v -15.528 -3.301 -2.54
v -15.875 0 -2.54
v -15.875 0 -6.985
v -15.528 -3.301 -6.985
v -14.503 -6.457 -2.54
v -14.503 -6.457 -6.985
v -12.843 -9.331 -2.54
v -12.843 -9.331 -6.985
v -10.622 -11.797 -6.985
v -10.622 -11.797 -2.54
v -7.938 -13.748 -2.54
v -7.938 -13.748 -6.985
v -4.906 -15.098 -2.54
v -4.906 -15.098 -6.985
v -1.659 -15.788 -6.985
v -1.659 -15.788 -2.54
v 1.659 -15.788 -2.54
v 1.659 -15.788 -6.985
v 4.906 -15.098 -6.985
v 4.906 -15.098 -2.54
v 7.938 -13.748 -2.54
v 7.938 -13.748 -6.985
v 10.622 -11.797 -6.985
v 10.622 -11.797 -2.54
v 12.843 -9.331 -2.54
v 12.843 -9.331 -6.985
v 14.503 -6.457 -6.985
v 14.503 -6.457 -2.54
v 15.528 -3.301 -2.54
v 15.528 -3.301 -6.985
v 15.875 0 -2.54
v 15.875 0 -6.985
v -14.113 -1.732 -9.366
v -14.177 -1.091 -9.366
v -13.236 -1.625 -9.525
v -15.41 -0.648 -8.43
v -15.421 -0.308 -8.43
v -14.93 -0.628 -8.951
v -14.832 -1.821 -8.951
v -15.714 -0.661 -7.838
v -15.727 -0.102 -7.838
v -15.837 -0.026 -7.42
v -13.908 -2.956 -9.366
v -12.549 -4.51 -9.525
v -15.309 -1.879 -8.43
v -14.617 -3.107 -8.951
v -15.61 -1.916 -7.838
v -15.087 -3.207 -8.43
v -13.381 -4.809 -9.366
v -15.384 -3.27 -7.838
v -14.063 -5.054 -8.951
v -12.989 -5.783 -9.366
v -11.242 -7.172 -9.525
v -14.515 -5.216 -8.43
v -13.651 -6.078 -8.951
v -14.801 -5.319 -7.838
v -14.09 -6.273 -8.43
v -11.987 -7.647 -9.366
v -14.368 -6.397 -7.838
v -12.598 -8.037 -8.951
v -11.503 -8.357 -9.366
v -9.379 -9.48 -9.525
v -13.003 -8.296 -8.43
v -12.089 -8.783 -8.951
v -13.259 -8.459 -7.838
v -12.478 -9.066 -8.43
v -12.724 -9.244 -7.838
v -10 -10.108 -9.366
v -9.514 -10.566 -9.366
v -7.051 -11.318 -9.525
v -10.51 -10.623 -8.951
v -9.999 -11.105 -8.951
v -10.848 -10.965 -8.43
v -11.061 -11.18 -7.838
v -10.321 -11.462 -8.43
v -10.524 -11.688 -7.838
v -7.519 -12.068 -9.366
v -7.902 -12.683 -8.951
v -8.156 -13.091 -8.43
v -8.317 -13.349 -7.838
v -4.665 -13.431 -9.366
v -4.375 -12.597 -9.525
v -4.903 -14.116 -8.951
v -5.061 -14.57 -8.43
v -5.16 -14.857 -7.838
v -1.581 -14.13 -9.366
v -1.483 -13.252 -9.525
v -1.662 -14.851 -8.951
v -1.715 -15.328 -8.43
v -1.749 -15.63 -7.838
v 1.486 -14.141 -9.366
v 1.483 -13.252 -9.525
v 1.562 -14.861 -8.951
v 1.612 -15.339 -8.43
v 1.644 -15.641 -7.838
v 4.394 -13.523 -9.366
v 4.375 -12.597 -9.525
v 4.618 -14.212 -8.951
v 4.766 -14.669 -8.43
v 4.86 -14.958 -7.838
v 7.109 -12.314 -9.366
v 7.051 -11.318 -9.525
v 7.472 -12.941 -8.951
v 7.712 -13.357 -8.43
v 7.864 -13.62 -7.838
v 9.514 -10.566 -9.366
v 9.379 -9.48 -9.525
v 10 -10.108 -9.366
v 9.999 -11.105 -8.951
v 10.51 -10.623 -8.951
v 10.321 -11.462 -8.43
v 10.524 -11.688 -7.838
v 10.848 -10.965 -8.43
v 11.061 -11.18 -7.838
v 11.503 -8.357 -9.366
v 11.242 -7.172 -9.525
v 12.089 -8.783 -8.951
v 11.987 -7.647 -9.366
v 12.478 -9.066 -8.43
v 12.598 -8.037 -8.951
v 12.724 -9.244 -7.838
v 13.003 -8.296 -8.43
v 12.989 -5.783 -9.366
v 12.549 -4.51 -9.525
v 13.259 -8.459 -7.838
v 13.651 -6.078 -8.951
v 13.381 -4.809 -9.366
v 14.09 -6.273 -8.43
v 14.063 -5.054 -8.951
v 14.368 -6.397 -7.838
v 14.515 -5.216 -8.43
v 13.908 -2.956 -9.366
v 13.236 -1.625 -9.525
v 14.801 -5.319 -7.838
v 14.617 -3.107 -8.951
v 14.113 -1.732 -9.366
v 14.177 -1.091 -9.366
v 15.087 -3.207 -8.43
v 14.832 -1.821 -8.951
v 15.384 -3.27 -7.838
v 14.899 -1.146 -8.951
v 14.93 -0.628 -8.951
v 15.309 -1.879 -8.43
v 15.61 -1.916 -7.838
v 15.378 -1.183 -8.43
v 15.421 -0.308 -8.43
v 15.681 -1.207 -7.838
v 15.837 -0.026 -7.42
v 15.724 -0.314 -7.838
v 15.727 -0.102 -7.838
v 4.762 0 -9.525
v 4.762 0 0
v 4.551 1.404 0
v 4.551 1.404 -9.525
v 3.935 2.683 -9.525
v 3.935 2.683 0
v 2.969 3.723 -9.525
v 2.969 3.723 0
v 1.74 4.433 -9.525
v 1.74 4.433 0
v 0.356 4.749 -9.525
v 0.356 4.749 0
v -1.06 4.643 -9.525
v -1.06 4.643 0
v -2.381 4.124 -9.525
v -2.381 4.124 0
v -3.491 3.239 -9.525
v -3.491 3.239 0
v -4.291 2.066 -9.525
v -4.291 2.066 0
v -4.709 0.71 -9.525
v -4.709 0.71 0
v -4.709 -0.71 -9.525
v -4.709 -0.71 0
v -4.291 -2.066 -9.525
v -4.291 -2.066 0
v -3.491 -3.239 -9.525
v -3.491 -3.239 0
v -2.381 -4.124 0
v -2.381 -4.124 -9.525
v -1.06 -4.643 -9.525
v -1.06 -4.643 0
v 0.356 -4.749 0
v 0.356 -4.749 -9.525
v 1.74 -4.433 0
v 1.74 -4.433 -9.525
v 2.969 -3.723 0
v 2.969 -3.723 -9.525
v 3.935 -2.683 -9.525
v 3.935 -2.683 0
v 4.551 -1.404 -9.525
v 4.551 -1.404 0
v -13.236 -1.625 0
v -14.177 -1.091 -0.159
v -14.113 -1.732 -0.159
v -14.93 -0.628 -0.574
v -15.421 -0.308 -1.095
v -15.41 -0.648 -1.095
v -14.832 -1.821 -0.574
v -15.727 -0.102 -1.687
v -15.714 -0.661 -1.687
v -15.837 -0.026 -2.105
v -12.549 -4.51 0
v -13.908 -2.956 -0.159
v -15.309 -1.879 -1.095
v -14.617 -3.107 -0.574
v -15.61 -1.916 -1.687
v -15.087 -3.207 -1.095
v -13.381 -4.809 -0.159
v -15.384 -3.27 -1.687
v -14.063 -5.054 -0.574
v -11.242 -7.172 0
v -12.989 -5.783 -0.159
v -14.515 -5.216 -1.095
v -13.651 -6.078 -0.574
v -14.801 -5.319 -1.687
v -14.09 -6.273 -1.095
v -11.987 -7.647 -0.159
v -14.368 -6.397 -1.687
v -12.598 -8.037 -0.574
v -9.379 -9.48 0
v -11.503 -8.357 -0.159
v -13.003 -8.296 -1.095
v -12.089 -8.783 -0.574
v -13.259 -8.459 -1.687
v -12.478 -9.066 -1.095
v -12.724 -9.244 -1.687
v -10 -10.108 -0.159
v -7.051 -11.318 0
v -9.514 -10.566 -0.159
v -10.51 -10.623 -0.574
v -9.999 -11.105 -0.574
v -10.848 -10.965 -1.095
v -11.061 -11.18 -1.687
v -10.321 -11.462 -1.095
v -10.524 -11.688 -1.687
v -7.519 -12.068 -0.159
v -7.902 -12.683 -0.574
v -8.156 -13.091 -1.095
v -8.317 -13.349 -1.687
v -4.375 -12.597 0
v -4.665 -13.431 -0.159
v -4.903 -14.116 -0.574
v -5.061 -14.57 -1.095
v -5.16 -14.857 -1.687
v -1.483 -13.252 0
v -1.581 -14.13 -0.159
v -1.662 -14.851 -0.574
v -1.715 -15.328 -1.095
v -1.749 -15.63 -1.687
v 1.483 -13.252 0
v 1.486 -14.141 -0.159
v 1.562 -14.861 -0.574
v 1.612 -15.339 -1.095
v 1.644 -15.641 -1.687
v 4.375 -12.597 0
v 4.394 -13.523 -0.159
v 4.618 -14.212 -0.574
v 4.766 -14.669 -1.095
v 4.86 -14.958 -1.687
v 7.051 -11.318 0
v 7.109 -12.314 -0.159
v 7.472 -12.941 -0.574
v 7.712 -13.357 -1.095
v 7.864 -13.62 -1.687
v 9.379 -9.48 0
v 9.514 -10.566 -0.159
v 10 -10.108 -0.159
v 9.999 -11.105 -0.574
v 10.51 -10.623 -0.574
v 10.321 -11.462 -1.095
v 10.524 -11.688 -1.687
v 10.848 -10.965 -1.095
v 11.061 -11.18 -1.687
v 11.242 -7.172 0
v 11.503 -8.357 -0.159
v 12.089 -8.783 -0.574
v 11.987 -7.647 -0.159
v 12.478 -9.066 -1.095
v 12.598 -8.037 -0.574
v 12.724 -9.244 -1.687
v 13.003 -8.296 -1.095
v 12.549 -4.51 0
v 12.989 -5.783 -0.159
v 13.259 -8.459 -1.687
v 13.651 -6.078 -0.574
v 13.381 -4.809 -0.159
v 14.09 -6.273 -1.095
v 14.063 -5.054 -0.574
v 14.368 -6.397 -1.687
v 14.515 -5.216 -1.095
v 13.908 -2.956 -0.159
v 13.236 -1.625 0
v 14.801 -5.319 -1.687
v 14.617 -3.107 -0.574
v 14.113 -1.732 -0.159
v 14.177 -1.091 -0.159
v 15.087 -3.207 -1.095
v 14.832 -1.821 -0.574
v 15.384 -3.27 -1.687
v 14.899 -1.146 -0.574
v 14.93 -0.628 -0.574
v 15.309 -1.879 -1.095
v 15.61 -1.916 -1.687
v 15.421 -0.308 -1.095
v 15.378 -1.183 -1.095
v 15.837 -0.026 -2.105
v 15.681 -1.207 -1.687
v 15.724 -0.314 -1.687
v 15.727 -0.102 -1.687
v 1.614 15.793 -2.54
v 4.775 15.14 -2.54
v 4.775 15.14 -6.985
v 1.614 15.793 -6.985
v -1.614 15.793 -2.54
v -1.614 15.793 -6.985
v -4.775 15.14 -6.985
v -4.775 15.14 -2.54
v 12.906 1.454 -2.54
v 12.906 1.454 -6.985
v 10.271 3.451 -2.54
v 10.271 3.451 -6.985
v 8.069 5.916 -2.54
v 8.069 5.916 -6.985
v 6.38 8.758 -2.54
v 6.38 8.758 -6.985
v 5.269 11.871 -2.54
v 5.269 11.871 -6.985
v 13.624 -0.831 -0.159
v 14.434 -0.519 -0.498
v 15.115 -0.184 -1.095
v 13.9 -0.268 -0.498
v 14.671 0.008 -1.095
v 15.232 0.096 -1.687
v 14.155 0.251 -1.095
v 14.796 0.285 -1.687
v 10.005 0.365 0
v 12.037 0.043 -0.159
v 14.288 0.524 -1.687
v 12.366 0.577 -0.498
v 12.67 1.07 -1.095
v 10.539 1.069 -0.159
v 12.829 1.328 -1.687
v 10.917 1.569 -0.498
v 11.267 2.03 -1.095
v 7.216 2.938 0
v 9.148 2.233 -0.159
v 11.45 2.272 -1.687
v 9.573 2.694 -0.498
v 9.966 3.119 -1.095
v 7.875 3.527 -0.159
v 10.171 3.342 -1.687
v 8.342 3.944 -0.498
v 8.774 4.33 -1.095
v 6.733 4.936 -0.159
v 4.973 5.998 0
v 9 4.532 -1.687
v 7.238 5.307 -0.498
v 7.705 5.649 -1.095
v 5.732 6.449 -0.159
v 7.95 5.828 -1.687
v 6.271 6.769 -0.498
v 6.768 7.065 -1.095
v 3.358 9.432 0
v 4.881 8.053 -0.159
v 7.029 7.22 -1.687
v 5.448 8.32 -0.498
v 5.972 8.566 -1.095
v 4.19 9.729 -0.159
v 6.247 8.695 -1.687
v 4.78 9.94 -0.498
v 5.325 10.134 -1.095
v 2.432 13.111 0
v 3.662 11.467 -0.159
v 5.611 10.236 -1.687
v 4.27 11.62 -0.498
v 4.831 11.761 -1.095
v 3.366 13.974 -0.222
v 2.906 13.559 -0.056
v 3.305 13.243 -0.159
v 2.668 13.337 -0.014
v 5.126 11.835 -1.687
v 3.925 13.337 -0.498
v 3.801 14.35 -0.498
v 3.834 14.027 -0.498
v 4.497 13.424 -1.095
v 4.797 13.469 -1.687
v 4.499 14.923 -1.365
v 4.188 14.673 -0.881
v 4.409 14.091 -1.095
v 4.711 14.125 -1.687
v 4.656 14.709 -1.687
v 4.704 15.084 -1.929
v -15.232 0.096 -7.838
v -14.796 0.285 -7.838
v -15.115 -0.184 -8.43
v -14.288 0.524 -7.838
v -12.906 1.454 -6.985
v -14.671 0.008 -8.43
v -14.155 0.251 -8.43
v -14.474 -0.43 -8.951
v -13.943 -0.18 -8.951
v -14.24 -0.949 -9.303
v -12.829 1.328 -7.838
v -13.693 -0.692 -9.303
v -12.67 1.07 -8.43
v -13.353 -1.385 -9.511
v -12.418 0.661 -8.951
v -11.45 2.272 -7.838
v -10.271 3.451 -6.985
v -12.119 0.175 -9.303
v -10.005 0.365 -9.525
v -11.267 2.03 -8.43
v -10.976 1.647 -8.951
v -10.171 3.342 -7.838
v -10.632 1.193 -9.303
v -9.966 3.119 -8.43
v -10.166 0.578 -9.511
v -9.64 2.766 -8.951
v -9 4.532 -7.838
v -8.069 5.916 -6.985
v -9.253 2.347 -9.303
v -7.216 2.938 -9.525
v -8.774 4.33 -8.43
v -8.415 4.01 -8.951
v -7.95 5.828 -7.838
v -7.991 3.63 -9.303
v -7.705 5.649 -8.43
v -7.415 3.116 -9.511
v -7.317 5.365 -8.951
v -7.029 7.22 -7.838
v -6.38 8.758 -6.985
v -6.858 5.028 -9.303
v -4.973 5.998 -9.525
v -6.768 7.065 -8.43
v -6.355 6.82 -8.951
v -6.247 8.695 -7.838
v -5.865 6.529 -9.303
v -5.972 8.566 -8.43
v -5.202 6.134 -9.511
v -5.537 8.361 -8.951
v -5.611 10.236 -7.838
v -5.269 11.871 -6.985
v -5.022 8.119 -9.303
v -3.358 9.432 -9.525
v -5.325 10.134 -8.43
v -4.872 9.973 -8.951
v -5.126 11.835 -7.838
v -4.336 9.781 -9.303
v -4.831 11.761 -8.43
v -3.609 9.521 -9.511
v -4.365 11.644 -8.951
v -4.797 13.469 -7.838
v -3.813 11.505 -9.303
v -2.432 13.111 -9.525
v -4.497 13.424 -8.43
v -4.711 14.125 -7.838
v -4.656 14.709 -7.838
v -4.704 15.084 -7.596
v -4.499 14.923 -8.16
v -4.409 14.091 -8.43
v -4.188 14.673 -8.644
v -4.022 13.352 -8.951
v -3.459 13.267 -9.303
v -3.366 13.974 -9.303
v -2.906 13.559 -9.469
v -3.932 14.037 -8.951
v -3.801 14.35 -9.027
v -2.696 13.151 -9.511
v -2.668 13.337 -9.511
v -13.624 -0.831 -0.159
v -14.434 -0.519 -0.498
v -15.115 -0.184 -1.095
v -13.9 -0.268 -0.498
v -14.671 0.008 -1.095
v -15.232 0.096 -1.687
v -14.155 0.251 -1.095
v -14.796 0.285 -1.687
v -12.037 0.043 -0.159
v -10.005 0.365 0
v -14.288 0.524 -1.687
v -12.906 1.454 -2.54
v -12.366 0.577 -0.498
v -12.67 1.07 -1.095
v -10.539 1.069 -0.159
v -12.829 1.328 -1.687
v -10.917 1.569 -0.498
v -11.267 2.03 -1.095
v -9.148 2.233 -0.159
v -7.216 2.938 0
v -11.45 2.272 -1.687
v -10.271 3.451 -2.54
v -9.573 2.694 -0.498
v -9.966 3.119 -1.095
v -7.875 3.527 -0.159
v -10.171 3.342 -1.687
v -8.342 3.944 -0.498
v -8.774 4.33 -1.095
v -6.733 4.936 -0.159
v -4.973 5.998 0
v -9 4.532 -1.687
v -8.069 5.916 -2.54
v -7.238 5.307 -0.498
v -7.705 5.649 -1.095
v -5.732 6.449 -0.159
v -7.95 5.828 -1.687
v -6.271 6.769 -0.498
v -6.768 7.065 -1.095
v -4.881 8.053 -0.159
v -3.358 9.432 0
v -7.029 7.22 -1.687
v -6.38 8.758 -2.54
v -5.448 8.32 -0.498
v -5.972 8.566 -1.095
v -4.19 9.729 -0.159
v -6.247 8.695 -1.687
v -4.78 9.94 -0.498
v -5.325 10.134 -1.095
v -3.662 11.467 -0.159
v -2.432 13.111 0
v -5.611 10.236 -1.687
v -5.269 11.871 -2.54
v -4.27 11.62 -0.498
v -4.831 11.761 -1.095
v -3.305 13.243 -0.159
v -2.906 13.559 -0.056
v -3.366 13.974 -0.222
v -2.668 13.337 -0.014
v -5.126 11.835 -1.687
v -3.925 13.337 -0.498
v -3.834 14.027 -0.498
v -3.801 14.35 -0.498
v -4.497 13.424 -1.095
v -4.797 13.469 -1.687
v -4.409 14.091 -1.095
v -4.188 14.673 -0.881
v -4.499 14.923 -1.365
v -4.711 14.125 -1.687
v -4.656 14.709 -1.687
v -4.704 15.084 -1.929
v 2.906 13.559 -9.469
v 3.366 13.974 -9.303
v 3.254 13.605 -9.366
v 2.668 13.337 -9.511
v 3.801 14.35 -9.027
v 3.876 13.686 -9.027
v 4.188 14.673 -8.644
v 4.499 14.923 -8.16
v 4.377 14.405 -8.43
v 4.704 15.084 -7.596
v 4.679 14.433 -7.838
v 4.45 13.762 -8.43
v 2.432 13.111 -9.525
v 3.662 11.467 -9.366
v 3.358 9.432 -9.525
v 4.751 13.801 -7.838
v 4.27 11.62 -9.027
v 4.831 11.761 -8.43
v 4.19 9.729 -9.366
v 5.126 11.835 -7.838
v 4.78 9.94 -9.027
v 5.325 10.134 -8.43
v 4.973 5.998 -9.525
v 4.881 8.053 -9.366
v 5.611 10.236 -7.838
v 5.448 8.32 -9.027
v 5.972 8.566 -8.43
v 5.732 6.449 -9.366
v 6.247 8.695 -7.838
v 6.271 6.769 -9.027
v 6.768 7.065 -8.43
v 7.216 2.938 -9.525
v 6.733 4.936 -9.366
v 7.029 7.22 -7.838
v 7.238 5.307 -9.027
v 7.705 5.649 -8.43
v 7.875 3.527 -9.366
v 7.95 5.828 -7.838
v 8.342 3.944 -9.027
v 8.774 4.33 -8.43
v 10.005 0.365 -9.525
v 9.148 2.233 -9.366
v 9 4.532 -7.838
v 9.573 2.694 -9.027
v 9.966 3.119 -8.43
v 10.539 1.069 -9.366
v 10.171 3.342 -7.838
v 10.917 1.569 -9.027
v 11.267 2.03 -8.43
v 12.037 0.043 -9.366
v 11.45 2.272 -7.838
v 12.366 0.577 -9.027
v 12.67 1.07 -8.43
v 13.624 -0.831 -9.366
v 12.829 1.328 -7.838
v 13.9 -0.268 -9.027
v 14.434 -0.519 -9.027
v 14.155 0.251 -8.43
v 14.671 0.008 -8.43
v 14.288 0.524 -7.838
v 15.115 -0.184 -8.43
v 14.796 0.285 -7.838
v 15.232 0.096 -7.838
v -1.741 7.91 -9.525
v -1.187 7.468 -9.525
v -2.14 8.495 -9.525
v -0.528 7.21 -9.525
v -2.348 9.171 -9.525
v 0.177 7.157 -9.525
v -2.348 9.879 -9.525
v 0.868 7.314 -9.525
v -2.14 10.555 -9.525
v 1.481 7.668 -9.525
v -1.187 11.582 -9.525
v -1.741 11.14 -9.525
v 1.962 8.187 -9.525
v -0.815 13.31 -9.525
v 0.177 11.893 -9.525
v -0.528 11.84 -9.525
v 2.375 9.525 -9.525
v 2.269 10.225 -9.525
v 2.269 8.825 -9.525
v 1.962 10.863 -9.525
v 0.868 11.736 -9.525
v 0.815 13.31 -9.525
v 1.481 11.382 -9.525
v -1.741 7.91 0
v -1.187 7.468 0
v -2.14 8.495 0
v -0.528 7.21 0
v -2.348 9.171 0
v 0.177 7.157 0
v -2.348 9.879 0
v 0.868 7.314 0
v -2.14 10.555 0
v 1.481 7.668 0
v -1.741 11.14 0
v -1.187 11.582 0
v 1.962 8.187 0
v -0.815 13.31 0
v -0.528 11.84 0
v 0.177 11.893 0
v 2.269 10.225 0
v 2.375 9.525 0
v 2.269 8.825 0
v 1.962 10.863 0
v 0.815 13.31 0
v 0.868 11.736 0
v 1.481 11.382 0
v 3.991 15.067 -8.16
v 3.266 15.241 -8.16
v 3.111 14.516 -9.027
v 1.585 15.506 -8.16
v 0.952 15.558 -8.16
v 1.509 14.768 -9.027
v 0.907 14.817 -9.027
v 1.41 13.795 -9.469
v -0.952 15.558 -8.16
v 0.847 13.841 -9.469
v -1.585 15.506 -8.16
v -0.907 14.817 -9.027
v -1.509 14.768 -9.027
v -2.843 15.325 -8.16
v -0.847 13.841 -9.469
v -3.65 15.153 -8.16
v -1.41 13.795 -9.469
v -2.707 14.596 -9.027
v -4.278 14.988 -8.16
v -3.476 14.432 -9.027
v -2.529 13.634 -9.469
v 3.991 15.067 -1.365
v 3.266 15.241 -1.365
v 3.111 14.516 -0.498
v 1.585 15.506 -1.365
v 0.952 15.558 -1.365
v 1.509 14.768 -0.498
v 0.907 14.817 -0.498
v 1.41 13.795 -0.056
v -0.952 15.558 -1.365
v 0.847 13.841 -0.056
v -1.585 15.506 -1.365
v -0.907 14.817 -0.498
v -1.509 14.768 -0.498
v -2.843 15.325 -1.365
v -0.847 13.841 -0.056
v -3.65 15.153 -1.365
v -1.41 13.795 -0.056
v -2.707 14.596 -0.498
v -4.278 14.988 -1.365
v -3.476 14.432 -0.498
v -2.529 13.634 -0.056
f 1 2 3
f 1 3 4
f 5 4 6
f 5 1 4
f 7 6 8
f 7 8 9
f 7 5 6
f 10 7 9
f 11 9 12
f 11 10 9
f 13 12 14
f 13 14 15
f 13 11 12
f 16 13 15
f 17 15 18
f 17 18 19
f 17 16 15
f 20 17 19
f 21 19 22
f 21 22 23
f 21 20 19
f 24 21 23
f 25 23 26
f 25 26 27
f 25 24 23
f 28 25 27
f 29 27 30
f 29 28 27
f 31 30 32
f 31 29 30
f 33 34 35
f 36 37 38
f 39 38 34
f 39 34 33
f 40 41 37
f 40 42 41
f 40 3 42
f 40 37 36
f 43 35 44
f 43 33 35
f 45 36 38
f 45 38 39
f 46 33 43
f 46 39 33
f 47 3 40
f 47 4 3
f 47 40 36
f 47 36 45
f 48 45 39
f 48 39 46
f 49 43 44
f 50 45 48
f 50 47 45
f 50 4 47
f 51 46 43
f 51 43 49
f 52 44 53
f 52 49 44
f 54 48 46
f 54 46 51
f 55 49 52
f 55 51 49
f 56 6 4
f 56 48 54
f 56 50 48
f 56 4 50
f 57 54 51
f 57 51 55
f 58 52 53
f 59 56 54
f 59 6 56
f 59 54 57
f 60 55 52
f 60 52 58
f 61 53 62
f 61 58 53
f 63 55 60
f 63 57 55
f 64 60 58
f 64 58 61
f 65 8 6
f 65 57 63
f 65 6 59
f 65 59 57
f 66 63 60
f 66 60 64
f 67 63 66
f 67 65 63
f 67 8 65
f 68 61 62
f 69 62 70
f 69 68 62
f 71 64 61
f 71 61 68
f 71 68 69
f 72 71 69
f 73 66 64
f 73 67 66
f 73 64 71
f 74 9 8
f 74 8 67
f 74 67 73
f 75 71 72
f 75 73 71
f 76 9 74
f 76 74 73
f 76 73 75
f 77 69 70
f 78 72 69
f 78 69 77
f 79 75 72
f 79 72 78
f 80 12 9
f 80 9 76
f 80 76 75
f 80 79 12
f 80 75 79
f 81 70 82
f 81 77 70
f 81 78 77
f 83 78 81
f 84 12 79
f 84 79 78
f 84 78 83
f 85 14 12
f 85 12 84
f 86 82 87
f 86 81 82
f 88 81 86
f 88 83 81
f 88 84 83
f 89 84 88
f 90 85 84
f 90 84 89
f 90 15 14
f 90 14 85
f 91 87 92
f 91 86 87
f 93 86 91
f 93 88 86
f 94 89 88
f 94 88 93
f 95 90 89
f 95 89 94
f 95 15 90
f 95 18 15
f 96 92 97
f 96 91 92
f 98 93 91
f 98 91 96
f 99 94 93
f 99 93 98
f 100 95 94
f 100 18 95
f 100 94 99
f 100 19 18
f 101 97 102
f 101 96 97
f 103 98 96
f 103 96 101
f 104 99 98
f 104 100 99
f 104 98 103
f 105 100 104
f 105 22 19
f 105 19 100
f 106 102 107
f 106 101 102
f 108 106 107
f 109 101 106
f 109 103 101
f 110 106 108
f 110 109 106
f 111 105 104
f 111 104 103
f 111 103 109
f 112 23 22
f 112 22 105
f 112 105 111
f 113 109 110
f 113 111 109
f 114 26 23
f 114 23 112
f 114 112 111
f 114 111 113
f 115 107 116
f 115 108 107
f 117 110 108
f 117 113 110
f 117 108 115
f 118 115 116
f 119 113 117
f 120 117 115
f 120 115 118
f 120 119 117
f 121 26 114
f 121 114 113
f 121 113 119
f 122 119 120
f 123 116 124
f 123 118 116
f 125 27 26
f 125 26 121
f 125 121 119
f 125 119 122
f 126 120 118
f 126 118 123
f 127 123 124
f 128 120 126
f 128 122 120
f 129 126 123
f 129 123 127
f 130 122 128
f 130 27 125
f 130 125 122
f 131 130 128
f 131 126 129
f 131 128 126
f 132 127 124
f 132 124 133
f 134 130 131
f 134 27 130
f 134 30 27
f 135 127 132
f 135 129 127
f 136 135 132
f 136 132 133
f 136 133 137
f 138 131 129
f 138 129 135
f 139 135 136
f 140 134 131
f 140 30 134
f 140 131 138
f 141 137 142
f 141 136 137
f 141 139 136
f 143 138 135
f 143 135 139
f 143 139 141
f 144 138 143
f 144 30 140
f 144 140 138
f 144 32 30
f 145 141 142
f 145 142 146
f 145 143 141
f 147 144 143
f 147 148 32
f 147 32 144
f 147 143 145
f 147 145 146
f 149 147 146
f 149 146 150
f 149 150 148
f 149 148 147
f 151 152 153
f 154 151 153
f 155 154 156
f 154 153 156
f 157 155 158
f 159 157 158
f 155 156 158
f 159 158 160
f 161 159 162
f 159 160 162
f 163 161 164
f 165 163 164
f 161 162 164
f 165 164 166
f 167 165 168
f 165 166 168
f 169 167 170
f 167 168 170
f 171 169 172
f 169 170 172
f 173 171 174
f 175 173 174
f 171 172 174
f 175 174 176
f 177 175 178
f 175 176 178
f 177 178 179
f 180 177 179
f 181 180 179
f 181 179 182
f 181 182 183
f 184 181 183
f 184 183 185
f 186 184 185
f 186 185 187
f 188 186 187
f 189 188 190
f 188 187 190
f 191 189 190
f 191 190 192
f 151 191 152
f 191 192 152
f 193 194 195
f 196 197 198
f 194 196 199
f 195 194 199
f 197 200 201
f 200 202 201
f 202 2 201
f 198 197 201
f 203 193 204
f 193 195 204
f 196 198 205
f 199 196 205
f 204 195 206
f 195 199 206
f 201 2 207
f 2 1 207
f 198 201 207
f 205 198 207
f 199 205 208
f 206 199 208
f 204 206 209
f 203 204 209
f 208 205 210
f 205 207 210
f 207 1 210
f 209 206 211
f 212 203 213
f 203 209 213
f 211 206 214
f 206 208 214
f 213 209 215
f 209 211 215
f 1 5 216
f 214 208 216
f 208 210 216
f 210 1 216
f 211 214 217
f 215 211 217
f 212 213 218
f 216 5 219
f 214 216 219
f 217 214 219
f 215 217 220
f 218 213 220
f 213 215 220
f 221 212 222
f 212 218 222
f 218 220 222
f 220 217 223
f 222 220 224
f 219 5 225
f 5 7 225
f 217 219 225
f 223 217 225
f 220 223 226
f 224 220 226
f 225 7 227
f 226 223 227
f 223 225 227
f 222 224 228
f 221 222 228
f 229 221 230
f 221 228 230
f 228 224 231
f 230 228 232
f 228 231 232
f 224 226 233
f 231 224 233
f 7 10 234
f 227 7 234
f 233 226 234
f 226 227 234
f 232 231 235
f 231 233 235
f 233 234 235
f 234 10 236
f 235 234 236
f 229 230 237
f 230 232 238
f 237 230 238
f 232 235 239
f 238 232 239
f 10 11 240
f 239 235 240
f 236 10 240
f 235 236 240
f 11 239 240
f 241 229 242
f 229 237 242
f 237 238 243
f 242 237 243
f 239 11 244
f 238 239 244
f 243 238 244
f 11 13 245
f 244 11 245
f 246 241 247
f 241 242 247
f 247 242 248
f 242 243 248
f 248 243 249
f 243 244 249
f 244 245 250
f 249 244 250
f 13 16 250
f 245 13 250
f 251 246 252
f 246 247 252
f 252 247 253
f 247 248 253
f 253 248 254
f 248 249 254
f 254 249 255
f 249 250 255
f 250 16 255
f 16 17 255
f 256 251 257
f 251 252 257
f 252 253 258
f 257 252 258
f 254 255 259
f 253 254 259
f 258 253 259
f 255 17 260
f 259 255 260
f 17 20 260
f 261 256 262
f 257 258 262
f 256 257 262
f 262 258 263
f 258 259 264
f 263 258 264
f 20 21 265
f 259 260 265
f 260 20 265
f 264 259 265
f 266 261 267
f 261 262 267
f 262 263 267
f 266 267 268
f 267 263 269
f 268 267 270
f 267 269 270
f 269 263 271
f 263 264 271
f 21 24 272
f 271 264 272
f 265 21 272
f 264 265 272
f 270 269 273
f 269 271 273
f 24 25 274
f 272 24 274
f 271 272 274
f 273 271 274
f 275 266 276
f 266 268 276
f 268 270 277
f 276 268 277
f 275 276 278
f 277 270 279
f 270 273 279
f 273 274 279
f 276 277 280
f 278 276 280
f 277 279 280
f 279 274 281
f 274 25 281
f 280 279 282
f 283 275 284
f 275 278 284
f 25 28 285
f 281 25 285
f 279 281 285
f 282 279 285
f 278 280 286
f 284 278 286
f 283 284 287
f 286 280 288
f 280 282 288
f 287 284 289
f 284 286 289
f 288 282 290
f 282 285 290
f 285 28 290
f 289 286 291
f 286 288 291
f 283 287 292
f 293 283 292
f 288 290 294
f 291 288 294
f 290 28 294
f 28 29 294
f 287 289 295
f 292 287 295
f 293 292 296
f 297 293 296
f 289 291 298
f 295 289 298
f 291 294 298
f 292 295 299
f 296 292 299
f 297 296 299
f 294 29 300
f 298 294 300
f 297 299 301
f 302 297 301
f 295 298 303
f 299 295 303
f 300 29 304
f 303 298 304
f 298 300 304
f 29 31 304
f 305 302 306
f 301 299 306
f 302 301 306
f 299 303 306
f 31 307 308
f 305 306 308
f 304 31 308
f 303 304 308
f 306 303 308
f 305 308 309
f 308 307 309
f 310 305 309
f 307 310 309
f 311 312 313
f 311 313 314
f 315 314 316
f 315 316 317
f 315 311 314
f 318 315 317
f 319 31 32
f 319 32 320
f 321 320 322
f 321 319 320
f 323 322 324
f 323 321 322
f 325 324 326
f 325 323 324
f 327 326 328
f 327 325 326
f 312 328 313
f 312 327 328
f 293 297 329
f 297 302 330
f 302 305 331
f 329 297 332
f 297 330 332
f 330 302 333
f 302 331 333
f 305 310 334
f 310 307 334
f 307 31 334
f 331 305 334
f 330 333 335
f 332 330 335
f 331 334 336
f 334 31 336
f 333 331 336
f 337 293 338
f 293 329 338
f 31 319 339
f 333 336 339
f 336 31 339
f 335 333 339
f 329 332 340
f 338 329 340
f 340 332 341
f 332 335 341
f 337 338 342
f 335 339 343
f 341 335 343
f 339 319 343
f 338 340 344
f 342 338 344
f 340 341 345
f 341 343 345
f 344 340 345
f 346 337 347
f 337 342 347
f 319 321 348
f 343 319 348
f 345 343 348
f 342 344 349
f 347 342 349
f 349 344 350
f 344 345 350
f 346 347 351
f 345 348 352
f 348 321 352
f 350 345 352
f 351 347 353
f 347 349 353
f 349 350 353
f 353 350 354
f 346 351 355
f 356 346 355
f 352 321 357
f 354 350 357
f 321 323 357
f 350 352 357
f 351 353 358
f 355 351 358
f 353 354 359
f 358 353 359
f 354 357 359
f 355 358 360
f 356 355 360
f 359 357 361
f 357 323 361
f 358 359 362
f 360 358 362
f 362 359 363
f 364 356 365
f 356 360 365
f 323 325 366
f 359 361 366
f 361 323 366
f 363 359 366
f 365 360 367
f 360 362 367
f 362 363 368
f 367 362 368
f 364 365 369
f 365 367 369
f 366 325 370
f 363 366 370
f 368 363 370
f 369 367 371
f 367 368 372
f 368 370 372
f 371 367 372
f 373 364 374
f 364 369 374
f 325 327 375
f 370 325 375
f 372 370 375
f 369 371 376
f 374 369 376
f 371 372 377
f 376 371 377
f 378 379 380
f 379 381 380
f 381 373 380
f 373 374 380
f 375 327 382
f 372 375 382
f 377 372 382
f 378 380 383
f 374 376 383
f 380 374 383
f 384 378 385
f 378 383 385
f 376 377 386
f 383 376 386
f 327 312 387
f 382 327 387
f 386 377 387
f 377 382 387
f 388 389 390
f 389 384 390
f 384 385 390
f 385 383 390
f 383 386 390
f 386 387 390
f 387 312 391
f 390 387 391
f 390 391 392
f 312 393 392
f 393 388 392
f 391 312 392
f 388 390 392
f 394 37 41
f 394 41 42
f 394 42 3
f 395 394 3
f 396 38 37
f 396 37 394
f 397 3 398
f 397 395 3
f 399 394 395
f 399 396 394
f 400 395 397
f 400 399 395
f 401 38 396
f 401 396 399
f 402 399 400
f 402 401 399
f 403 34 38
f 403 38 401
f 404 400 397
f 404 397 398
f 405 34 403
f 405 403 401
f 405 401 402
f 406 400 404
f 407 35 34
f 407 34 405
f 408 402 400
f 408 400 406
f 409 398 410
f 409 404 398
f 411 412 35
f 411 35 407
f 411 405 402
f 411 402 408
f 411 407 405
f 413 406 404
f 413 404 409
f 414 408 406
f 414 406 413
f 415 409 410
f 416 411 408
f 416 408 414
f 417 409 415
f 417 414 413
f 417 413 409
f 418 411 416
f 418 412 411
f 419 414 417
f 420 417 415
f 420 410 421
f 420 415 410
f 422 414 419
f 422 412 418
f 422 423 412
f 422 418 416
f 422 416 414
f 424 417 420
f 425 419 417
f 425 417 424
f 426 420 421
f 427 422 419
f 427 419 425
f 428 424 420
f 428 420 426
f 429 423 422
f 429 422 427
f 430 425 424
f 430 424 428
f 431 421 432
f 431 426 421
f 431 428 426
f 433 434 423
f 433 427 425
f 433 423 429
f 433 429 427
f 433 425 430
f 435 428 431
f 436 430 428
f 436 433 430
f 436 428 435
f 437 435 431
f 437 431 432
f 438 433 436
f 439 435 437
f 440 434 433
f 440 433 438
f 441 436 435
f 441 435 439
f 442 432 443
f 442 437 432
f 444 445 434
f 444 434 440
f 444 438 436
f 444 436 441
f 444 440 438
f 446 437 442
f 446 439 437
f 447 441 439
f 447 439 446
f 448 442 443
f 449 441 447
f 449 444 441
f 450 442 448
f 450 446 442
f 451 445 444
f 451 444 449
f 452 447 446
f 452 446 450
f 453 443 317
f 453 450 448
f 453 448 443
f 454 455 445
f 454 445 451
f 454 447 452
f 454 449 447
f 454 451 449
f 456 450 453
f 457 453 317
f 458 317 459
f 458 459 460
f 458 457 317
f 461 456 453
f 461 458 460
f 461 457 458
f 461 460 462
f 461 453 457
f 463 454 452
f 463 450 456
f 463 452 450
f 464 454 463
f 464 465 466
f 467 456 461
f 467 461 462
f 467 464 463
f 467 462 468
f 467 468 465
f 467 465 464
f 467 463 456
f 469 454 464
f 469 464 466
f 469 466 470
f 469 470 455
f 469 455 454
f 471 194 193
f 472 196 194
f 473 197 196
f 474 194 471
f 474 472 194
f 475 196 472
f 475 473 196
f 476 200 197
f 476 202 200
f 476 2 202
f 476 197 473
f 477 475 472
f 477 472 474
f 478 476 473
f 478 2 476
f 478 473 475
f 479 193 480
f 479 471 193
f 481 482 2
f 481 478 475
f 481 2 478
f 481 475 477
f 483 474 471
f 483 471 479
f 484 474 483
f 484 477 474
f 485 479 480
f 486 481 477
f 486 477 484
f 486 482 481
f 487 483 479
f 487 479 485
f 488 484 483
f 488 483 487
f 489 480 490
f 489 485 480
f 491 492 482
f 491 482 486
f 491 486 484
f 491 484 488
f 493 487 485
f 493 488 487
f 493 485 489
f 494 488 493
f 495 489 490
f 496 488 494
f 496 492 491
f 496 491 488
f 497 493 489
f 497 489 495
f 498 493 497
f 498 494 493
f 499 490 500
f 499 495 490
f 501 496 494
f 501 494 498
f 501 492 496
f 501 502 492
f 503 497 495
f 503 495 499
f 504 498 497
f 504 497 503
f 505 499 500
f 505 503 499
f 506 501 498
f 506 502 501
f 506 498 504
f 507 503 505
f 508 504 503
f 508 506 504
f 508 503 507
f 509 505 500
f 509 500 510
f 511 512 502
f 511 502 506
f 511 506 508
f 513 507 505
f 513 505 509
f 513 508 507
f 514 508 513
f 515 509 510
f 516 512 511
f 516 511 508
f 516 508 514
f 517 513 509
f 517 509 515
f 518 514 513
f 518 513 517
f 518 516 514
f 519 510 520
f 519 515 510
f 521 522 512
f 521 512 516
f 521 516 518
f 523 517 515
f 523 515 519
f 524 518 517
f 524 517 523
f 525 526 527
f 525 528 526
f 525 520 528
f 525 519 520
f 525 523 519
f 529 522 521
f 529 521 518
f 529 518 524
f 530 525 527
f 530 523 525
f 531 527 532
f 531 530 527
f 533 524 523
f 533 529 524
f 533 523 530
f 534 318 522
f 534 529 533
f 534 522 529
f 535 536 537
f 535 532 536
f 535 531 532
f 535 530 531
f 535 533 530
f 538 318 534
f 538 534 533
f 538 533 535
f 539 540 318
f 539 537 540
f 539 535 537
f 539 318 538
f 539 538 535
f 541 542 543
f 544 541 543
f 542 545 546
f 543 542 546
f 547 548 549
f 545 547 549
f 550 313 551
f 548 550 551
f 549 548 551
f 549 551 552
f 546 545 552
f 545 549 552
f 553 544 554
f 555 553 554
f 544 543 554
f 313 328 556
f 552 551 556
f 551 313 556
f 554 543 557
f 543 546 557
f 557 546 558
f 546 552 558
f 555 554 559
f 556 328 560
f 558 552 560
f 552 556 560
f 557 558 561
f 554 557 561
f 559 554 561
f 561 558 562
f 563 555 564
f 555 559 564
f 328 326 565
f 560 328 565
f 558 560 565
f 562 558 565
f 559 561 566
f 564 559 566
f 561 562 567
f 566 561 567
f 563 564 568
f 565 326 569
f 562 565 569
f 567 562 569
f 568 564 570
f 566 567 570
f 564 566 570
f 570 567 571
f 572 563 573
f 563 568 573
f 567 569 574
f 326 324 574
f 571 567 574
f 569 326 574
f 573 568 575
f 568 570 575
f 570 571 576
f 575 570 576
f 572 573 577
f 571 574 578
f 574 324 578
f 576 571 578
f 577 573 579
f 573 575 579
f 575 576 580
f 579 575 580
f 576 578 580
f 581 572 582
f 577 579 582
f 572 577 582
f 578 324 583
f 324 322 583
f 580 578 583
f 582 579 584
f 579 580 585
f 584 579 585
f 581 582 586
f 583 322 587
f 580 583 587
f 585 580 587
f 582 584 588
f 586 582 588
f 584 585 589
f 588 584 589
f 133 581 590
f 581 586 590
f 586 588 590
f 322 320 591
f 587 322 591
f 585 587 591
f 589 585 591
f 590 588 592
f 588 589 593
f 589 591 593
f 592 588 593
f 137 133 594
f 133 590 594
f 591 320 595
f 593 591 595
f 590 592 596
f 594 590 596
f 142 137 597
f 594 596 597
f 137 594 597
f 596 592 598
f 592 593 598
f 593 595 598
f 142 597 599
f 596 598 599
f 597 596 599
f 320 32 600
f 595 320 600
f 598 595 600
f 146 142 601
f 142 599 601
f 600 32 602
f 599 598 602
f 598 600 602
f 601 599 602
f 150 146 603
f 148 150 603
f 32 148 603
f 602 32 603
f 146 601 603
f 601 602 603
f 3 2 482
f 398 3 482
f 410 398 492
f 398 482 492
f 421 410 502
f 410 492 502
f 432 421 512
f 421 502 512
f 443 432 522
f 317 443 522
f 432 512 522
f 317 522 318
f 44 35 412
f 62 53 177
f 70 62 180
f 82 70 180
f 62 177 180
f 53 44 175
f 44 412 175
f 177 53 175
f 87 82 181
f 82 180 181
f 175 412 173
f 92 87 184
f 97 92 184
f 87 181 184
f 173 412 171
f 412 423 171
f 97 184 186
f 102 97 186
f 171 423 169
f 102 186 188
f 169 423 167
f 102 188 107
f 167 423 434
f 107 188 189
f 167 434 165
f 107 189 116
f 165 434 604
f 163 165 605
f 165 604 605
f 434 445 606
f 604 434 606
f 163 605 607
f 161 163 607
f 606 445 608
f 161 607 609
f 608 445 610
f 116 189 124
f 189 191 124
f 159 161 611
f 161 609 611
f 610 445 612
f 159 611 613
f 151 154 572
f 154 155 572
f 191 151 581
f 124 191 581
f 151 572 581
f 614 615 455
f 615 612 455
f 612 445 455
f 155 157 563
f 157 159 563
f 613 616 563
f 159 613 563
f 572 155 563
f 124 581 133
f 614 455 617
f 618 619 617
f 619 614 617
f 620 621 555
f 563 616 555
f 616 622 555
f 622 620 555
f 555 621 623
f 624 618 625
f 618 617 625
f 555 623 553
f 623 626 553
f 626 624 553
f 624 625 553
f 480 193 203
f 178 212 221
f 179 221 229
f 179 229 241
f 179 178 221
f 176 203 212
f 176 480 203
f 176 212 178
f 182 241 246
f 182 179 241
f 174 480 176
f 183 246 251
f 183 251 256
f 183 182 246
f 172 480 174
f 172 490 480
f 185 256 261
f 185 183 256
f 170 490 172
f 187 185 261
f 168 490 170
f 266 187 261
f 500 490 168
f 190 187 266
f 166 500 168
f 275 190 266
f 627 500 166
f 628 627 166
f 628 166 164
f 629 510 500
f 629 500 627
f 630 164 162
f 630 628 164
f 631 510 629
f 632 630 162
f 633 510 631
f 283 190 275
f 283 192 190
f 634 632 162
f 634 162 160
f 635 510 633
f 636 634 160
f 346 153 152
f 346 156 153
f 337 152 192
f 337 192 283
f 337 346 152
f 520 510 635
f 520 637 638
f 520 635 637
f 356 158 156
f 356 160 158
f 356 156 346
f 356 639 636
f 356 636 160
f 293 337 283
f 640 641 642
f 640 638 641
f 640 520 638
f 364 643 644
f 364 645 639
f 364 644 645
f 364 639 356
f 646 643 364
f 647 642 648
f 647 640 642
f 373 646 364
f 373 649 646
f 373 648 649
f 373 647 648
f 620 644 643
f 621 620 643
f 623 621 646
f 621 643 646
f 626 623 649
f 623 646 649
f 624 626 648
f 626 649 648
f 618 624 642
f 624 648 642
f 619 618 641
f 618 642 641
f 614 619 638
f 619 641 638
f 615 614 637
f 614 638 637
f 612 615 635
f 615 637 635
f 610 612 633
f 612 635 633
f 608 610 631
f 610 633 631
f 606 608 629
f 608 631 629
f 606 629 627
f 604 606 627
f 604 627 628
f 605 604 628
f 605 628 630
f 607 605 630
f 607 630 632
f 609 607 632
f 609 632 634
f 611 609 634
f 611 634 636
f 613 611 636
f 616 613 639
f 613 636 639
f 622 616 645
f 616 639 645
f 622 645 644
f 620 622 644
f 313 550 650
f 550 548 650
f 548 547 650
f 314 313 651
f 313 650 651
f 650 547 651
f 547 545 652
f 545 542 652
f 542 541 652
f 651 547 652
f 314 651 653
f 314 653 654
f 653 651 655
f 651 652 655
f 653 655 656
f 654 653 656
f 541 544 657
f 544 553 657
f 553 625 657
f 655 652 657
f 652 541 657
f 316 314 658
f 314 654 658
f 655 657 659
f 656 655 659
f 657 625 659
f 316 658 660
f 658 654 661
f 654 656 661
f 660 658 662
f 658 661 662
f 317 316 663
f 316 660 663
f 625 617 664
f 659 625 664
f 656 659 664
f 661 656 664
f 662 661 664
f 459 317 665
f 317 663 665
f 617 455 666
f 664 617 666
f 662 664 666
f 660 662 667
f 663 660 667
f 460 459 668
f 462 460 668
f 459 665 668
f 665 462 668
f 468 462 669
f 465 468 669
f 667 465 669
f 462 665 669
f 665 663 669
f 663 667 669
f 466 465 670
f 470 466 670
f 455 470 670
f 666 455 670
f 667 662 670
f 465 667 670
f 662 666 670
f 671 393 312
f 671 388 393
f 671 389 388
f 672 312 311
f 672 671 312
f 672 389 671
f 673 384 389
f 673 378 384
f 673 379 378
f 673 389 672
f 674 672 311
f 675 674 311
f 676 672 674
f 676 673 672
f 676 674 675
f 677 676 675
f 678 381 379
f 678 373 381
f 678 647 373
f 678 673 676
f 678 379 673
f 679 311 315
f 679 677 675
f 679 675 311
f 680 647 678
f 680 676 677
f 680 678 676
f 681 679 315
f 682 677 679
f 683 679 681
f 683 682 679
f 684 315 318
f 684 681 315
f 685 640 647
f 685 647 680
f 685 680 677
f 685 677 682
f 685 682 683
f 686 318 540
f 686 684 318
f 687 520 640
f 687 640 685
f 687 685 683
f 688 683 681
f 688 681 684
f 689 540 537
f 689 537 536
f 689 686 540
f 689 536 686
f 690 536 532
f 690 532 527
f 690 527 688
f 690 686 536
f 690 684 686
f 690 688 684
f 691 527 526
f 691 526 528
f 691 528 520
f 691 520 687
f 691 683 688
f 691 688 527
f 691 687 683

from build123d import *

# Parameters (mm, degrees)
SKETCH1_R           = 15.875
SKETCH1_R_2         = 4.7625
SKETCH1_R_3         = 2.3749
BOSS_EXTRUDE1_DEPTH = 9.525
CUT_EXTRUDE1_DEPTH  = 10.525
FILLET1_R           = 2.54
FILLET2_R           = 2.54


with BuildPart() as part:
    # Sketch1 → Boss-Extrude1 (new body)
    with BuildSketch(Plane.XY):
        Circle(SKETCH1_R)
        Circle(SKETCH1_R_2, mode=Mode.SUBTRACT)
        with Locations((0, 9.525)):
            Circle(SKETCH1_R_3, mode=Mode.SUBTRACT)
    extrude(amount=-BOSS_EXTRUDE1_DEPTH)

    # Sketch2 → Cut-Extrude1 (cut, through all)
    with BuildSketch(Plane.XY):
        with BuildLine():
            ThreePointArc((-15.875, 0), (-8.06886604, 5.915724645), (-4.7752, 15.139785004))
            ThreePointArc((-4.7752, 15.139785004), (-12.802771673, 9.386408392), (-15.875, 0))
        make_face()
        with BuildLine():
            ThreePointArc((15.875, 0), (8.06886604, 5.915724645), (4.7752, 15.139785004))
            ThreePointArc((4.7752, 15.139785004), (12.802771673, 9.386408392), (15.875, 0))
        make_face()
    extrude(amount=-CUT_EXTRUDE1_DEPTH, mode=Mode.SUBTRACT)

    # Fillet1
    fillet1_edges = [part.edges().sort_by_distance(p)[0] for p in [
        (0, 15.875, 0),
        (0, -15.875, 0),
        (-8.06886604, 5.915724645, 0),
        (8.06886604, 5.915724645, 0),
    ]]
    fillet(fillet1_edges, radius=FILLET1_R)

    # Fillet2
    fillet2_edges = [part.edges().sort_by_distance(p)[0] for p in [
        (0, 15.875, -9.525),
        (0, -15.875, -9.525),
        (-8.06886604, 5.915724645, -9.525),
        (8.06886604, 5.915724645, -9.525),
    ]]
    fillet(fillet2_edges, radius=FILLET2_R)


solid = part.part
